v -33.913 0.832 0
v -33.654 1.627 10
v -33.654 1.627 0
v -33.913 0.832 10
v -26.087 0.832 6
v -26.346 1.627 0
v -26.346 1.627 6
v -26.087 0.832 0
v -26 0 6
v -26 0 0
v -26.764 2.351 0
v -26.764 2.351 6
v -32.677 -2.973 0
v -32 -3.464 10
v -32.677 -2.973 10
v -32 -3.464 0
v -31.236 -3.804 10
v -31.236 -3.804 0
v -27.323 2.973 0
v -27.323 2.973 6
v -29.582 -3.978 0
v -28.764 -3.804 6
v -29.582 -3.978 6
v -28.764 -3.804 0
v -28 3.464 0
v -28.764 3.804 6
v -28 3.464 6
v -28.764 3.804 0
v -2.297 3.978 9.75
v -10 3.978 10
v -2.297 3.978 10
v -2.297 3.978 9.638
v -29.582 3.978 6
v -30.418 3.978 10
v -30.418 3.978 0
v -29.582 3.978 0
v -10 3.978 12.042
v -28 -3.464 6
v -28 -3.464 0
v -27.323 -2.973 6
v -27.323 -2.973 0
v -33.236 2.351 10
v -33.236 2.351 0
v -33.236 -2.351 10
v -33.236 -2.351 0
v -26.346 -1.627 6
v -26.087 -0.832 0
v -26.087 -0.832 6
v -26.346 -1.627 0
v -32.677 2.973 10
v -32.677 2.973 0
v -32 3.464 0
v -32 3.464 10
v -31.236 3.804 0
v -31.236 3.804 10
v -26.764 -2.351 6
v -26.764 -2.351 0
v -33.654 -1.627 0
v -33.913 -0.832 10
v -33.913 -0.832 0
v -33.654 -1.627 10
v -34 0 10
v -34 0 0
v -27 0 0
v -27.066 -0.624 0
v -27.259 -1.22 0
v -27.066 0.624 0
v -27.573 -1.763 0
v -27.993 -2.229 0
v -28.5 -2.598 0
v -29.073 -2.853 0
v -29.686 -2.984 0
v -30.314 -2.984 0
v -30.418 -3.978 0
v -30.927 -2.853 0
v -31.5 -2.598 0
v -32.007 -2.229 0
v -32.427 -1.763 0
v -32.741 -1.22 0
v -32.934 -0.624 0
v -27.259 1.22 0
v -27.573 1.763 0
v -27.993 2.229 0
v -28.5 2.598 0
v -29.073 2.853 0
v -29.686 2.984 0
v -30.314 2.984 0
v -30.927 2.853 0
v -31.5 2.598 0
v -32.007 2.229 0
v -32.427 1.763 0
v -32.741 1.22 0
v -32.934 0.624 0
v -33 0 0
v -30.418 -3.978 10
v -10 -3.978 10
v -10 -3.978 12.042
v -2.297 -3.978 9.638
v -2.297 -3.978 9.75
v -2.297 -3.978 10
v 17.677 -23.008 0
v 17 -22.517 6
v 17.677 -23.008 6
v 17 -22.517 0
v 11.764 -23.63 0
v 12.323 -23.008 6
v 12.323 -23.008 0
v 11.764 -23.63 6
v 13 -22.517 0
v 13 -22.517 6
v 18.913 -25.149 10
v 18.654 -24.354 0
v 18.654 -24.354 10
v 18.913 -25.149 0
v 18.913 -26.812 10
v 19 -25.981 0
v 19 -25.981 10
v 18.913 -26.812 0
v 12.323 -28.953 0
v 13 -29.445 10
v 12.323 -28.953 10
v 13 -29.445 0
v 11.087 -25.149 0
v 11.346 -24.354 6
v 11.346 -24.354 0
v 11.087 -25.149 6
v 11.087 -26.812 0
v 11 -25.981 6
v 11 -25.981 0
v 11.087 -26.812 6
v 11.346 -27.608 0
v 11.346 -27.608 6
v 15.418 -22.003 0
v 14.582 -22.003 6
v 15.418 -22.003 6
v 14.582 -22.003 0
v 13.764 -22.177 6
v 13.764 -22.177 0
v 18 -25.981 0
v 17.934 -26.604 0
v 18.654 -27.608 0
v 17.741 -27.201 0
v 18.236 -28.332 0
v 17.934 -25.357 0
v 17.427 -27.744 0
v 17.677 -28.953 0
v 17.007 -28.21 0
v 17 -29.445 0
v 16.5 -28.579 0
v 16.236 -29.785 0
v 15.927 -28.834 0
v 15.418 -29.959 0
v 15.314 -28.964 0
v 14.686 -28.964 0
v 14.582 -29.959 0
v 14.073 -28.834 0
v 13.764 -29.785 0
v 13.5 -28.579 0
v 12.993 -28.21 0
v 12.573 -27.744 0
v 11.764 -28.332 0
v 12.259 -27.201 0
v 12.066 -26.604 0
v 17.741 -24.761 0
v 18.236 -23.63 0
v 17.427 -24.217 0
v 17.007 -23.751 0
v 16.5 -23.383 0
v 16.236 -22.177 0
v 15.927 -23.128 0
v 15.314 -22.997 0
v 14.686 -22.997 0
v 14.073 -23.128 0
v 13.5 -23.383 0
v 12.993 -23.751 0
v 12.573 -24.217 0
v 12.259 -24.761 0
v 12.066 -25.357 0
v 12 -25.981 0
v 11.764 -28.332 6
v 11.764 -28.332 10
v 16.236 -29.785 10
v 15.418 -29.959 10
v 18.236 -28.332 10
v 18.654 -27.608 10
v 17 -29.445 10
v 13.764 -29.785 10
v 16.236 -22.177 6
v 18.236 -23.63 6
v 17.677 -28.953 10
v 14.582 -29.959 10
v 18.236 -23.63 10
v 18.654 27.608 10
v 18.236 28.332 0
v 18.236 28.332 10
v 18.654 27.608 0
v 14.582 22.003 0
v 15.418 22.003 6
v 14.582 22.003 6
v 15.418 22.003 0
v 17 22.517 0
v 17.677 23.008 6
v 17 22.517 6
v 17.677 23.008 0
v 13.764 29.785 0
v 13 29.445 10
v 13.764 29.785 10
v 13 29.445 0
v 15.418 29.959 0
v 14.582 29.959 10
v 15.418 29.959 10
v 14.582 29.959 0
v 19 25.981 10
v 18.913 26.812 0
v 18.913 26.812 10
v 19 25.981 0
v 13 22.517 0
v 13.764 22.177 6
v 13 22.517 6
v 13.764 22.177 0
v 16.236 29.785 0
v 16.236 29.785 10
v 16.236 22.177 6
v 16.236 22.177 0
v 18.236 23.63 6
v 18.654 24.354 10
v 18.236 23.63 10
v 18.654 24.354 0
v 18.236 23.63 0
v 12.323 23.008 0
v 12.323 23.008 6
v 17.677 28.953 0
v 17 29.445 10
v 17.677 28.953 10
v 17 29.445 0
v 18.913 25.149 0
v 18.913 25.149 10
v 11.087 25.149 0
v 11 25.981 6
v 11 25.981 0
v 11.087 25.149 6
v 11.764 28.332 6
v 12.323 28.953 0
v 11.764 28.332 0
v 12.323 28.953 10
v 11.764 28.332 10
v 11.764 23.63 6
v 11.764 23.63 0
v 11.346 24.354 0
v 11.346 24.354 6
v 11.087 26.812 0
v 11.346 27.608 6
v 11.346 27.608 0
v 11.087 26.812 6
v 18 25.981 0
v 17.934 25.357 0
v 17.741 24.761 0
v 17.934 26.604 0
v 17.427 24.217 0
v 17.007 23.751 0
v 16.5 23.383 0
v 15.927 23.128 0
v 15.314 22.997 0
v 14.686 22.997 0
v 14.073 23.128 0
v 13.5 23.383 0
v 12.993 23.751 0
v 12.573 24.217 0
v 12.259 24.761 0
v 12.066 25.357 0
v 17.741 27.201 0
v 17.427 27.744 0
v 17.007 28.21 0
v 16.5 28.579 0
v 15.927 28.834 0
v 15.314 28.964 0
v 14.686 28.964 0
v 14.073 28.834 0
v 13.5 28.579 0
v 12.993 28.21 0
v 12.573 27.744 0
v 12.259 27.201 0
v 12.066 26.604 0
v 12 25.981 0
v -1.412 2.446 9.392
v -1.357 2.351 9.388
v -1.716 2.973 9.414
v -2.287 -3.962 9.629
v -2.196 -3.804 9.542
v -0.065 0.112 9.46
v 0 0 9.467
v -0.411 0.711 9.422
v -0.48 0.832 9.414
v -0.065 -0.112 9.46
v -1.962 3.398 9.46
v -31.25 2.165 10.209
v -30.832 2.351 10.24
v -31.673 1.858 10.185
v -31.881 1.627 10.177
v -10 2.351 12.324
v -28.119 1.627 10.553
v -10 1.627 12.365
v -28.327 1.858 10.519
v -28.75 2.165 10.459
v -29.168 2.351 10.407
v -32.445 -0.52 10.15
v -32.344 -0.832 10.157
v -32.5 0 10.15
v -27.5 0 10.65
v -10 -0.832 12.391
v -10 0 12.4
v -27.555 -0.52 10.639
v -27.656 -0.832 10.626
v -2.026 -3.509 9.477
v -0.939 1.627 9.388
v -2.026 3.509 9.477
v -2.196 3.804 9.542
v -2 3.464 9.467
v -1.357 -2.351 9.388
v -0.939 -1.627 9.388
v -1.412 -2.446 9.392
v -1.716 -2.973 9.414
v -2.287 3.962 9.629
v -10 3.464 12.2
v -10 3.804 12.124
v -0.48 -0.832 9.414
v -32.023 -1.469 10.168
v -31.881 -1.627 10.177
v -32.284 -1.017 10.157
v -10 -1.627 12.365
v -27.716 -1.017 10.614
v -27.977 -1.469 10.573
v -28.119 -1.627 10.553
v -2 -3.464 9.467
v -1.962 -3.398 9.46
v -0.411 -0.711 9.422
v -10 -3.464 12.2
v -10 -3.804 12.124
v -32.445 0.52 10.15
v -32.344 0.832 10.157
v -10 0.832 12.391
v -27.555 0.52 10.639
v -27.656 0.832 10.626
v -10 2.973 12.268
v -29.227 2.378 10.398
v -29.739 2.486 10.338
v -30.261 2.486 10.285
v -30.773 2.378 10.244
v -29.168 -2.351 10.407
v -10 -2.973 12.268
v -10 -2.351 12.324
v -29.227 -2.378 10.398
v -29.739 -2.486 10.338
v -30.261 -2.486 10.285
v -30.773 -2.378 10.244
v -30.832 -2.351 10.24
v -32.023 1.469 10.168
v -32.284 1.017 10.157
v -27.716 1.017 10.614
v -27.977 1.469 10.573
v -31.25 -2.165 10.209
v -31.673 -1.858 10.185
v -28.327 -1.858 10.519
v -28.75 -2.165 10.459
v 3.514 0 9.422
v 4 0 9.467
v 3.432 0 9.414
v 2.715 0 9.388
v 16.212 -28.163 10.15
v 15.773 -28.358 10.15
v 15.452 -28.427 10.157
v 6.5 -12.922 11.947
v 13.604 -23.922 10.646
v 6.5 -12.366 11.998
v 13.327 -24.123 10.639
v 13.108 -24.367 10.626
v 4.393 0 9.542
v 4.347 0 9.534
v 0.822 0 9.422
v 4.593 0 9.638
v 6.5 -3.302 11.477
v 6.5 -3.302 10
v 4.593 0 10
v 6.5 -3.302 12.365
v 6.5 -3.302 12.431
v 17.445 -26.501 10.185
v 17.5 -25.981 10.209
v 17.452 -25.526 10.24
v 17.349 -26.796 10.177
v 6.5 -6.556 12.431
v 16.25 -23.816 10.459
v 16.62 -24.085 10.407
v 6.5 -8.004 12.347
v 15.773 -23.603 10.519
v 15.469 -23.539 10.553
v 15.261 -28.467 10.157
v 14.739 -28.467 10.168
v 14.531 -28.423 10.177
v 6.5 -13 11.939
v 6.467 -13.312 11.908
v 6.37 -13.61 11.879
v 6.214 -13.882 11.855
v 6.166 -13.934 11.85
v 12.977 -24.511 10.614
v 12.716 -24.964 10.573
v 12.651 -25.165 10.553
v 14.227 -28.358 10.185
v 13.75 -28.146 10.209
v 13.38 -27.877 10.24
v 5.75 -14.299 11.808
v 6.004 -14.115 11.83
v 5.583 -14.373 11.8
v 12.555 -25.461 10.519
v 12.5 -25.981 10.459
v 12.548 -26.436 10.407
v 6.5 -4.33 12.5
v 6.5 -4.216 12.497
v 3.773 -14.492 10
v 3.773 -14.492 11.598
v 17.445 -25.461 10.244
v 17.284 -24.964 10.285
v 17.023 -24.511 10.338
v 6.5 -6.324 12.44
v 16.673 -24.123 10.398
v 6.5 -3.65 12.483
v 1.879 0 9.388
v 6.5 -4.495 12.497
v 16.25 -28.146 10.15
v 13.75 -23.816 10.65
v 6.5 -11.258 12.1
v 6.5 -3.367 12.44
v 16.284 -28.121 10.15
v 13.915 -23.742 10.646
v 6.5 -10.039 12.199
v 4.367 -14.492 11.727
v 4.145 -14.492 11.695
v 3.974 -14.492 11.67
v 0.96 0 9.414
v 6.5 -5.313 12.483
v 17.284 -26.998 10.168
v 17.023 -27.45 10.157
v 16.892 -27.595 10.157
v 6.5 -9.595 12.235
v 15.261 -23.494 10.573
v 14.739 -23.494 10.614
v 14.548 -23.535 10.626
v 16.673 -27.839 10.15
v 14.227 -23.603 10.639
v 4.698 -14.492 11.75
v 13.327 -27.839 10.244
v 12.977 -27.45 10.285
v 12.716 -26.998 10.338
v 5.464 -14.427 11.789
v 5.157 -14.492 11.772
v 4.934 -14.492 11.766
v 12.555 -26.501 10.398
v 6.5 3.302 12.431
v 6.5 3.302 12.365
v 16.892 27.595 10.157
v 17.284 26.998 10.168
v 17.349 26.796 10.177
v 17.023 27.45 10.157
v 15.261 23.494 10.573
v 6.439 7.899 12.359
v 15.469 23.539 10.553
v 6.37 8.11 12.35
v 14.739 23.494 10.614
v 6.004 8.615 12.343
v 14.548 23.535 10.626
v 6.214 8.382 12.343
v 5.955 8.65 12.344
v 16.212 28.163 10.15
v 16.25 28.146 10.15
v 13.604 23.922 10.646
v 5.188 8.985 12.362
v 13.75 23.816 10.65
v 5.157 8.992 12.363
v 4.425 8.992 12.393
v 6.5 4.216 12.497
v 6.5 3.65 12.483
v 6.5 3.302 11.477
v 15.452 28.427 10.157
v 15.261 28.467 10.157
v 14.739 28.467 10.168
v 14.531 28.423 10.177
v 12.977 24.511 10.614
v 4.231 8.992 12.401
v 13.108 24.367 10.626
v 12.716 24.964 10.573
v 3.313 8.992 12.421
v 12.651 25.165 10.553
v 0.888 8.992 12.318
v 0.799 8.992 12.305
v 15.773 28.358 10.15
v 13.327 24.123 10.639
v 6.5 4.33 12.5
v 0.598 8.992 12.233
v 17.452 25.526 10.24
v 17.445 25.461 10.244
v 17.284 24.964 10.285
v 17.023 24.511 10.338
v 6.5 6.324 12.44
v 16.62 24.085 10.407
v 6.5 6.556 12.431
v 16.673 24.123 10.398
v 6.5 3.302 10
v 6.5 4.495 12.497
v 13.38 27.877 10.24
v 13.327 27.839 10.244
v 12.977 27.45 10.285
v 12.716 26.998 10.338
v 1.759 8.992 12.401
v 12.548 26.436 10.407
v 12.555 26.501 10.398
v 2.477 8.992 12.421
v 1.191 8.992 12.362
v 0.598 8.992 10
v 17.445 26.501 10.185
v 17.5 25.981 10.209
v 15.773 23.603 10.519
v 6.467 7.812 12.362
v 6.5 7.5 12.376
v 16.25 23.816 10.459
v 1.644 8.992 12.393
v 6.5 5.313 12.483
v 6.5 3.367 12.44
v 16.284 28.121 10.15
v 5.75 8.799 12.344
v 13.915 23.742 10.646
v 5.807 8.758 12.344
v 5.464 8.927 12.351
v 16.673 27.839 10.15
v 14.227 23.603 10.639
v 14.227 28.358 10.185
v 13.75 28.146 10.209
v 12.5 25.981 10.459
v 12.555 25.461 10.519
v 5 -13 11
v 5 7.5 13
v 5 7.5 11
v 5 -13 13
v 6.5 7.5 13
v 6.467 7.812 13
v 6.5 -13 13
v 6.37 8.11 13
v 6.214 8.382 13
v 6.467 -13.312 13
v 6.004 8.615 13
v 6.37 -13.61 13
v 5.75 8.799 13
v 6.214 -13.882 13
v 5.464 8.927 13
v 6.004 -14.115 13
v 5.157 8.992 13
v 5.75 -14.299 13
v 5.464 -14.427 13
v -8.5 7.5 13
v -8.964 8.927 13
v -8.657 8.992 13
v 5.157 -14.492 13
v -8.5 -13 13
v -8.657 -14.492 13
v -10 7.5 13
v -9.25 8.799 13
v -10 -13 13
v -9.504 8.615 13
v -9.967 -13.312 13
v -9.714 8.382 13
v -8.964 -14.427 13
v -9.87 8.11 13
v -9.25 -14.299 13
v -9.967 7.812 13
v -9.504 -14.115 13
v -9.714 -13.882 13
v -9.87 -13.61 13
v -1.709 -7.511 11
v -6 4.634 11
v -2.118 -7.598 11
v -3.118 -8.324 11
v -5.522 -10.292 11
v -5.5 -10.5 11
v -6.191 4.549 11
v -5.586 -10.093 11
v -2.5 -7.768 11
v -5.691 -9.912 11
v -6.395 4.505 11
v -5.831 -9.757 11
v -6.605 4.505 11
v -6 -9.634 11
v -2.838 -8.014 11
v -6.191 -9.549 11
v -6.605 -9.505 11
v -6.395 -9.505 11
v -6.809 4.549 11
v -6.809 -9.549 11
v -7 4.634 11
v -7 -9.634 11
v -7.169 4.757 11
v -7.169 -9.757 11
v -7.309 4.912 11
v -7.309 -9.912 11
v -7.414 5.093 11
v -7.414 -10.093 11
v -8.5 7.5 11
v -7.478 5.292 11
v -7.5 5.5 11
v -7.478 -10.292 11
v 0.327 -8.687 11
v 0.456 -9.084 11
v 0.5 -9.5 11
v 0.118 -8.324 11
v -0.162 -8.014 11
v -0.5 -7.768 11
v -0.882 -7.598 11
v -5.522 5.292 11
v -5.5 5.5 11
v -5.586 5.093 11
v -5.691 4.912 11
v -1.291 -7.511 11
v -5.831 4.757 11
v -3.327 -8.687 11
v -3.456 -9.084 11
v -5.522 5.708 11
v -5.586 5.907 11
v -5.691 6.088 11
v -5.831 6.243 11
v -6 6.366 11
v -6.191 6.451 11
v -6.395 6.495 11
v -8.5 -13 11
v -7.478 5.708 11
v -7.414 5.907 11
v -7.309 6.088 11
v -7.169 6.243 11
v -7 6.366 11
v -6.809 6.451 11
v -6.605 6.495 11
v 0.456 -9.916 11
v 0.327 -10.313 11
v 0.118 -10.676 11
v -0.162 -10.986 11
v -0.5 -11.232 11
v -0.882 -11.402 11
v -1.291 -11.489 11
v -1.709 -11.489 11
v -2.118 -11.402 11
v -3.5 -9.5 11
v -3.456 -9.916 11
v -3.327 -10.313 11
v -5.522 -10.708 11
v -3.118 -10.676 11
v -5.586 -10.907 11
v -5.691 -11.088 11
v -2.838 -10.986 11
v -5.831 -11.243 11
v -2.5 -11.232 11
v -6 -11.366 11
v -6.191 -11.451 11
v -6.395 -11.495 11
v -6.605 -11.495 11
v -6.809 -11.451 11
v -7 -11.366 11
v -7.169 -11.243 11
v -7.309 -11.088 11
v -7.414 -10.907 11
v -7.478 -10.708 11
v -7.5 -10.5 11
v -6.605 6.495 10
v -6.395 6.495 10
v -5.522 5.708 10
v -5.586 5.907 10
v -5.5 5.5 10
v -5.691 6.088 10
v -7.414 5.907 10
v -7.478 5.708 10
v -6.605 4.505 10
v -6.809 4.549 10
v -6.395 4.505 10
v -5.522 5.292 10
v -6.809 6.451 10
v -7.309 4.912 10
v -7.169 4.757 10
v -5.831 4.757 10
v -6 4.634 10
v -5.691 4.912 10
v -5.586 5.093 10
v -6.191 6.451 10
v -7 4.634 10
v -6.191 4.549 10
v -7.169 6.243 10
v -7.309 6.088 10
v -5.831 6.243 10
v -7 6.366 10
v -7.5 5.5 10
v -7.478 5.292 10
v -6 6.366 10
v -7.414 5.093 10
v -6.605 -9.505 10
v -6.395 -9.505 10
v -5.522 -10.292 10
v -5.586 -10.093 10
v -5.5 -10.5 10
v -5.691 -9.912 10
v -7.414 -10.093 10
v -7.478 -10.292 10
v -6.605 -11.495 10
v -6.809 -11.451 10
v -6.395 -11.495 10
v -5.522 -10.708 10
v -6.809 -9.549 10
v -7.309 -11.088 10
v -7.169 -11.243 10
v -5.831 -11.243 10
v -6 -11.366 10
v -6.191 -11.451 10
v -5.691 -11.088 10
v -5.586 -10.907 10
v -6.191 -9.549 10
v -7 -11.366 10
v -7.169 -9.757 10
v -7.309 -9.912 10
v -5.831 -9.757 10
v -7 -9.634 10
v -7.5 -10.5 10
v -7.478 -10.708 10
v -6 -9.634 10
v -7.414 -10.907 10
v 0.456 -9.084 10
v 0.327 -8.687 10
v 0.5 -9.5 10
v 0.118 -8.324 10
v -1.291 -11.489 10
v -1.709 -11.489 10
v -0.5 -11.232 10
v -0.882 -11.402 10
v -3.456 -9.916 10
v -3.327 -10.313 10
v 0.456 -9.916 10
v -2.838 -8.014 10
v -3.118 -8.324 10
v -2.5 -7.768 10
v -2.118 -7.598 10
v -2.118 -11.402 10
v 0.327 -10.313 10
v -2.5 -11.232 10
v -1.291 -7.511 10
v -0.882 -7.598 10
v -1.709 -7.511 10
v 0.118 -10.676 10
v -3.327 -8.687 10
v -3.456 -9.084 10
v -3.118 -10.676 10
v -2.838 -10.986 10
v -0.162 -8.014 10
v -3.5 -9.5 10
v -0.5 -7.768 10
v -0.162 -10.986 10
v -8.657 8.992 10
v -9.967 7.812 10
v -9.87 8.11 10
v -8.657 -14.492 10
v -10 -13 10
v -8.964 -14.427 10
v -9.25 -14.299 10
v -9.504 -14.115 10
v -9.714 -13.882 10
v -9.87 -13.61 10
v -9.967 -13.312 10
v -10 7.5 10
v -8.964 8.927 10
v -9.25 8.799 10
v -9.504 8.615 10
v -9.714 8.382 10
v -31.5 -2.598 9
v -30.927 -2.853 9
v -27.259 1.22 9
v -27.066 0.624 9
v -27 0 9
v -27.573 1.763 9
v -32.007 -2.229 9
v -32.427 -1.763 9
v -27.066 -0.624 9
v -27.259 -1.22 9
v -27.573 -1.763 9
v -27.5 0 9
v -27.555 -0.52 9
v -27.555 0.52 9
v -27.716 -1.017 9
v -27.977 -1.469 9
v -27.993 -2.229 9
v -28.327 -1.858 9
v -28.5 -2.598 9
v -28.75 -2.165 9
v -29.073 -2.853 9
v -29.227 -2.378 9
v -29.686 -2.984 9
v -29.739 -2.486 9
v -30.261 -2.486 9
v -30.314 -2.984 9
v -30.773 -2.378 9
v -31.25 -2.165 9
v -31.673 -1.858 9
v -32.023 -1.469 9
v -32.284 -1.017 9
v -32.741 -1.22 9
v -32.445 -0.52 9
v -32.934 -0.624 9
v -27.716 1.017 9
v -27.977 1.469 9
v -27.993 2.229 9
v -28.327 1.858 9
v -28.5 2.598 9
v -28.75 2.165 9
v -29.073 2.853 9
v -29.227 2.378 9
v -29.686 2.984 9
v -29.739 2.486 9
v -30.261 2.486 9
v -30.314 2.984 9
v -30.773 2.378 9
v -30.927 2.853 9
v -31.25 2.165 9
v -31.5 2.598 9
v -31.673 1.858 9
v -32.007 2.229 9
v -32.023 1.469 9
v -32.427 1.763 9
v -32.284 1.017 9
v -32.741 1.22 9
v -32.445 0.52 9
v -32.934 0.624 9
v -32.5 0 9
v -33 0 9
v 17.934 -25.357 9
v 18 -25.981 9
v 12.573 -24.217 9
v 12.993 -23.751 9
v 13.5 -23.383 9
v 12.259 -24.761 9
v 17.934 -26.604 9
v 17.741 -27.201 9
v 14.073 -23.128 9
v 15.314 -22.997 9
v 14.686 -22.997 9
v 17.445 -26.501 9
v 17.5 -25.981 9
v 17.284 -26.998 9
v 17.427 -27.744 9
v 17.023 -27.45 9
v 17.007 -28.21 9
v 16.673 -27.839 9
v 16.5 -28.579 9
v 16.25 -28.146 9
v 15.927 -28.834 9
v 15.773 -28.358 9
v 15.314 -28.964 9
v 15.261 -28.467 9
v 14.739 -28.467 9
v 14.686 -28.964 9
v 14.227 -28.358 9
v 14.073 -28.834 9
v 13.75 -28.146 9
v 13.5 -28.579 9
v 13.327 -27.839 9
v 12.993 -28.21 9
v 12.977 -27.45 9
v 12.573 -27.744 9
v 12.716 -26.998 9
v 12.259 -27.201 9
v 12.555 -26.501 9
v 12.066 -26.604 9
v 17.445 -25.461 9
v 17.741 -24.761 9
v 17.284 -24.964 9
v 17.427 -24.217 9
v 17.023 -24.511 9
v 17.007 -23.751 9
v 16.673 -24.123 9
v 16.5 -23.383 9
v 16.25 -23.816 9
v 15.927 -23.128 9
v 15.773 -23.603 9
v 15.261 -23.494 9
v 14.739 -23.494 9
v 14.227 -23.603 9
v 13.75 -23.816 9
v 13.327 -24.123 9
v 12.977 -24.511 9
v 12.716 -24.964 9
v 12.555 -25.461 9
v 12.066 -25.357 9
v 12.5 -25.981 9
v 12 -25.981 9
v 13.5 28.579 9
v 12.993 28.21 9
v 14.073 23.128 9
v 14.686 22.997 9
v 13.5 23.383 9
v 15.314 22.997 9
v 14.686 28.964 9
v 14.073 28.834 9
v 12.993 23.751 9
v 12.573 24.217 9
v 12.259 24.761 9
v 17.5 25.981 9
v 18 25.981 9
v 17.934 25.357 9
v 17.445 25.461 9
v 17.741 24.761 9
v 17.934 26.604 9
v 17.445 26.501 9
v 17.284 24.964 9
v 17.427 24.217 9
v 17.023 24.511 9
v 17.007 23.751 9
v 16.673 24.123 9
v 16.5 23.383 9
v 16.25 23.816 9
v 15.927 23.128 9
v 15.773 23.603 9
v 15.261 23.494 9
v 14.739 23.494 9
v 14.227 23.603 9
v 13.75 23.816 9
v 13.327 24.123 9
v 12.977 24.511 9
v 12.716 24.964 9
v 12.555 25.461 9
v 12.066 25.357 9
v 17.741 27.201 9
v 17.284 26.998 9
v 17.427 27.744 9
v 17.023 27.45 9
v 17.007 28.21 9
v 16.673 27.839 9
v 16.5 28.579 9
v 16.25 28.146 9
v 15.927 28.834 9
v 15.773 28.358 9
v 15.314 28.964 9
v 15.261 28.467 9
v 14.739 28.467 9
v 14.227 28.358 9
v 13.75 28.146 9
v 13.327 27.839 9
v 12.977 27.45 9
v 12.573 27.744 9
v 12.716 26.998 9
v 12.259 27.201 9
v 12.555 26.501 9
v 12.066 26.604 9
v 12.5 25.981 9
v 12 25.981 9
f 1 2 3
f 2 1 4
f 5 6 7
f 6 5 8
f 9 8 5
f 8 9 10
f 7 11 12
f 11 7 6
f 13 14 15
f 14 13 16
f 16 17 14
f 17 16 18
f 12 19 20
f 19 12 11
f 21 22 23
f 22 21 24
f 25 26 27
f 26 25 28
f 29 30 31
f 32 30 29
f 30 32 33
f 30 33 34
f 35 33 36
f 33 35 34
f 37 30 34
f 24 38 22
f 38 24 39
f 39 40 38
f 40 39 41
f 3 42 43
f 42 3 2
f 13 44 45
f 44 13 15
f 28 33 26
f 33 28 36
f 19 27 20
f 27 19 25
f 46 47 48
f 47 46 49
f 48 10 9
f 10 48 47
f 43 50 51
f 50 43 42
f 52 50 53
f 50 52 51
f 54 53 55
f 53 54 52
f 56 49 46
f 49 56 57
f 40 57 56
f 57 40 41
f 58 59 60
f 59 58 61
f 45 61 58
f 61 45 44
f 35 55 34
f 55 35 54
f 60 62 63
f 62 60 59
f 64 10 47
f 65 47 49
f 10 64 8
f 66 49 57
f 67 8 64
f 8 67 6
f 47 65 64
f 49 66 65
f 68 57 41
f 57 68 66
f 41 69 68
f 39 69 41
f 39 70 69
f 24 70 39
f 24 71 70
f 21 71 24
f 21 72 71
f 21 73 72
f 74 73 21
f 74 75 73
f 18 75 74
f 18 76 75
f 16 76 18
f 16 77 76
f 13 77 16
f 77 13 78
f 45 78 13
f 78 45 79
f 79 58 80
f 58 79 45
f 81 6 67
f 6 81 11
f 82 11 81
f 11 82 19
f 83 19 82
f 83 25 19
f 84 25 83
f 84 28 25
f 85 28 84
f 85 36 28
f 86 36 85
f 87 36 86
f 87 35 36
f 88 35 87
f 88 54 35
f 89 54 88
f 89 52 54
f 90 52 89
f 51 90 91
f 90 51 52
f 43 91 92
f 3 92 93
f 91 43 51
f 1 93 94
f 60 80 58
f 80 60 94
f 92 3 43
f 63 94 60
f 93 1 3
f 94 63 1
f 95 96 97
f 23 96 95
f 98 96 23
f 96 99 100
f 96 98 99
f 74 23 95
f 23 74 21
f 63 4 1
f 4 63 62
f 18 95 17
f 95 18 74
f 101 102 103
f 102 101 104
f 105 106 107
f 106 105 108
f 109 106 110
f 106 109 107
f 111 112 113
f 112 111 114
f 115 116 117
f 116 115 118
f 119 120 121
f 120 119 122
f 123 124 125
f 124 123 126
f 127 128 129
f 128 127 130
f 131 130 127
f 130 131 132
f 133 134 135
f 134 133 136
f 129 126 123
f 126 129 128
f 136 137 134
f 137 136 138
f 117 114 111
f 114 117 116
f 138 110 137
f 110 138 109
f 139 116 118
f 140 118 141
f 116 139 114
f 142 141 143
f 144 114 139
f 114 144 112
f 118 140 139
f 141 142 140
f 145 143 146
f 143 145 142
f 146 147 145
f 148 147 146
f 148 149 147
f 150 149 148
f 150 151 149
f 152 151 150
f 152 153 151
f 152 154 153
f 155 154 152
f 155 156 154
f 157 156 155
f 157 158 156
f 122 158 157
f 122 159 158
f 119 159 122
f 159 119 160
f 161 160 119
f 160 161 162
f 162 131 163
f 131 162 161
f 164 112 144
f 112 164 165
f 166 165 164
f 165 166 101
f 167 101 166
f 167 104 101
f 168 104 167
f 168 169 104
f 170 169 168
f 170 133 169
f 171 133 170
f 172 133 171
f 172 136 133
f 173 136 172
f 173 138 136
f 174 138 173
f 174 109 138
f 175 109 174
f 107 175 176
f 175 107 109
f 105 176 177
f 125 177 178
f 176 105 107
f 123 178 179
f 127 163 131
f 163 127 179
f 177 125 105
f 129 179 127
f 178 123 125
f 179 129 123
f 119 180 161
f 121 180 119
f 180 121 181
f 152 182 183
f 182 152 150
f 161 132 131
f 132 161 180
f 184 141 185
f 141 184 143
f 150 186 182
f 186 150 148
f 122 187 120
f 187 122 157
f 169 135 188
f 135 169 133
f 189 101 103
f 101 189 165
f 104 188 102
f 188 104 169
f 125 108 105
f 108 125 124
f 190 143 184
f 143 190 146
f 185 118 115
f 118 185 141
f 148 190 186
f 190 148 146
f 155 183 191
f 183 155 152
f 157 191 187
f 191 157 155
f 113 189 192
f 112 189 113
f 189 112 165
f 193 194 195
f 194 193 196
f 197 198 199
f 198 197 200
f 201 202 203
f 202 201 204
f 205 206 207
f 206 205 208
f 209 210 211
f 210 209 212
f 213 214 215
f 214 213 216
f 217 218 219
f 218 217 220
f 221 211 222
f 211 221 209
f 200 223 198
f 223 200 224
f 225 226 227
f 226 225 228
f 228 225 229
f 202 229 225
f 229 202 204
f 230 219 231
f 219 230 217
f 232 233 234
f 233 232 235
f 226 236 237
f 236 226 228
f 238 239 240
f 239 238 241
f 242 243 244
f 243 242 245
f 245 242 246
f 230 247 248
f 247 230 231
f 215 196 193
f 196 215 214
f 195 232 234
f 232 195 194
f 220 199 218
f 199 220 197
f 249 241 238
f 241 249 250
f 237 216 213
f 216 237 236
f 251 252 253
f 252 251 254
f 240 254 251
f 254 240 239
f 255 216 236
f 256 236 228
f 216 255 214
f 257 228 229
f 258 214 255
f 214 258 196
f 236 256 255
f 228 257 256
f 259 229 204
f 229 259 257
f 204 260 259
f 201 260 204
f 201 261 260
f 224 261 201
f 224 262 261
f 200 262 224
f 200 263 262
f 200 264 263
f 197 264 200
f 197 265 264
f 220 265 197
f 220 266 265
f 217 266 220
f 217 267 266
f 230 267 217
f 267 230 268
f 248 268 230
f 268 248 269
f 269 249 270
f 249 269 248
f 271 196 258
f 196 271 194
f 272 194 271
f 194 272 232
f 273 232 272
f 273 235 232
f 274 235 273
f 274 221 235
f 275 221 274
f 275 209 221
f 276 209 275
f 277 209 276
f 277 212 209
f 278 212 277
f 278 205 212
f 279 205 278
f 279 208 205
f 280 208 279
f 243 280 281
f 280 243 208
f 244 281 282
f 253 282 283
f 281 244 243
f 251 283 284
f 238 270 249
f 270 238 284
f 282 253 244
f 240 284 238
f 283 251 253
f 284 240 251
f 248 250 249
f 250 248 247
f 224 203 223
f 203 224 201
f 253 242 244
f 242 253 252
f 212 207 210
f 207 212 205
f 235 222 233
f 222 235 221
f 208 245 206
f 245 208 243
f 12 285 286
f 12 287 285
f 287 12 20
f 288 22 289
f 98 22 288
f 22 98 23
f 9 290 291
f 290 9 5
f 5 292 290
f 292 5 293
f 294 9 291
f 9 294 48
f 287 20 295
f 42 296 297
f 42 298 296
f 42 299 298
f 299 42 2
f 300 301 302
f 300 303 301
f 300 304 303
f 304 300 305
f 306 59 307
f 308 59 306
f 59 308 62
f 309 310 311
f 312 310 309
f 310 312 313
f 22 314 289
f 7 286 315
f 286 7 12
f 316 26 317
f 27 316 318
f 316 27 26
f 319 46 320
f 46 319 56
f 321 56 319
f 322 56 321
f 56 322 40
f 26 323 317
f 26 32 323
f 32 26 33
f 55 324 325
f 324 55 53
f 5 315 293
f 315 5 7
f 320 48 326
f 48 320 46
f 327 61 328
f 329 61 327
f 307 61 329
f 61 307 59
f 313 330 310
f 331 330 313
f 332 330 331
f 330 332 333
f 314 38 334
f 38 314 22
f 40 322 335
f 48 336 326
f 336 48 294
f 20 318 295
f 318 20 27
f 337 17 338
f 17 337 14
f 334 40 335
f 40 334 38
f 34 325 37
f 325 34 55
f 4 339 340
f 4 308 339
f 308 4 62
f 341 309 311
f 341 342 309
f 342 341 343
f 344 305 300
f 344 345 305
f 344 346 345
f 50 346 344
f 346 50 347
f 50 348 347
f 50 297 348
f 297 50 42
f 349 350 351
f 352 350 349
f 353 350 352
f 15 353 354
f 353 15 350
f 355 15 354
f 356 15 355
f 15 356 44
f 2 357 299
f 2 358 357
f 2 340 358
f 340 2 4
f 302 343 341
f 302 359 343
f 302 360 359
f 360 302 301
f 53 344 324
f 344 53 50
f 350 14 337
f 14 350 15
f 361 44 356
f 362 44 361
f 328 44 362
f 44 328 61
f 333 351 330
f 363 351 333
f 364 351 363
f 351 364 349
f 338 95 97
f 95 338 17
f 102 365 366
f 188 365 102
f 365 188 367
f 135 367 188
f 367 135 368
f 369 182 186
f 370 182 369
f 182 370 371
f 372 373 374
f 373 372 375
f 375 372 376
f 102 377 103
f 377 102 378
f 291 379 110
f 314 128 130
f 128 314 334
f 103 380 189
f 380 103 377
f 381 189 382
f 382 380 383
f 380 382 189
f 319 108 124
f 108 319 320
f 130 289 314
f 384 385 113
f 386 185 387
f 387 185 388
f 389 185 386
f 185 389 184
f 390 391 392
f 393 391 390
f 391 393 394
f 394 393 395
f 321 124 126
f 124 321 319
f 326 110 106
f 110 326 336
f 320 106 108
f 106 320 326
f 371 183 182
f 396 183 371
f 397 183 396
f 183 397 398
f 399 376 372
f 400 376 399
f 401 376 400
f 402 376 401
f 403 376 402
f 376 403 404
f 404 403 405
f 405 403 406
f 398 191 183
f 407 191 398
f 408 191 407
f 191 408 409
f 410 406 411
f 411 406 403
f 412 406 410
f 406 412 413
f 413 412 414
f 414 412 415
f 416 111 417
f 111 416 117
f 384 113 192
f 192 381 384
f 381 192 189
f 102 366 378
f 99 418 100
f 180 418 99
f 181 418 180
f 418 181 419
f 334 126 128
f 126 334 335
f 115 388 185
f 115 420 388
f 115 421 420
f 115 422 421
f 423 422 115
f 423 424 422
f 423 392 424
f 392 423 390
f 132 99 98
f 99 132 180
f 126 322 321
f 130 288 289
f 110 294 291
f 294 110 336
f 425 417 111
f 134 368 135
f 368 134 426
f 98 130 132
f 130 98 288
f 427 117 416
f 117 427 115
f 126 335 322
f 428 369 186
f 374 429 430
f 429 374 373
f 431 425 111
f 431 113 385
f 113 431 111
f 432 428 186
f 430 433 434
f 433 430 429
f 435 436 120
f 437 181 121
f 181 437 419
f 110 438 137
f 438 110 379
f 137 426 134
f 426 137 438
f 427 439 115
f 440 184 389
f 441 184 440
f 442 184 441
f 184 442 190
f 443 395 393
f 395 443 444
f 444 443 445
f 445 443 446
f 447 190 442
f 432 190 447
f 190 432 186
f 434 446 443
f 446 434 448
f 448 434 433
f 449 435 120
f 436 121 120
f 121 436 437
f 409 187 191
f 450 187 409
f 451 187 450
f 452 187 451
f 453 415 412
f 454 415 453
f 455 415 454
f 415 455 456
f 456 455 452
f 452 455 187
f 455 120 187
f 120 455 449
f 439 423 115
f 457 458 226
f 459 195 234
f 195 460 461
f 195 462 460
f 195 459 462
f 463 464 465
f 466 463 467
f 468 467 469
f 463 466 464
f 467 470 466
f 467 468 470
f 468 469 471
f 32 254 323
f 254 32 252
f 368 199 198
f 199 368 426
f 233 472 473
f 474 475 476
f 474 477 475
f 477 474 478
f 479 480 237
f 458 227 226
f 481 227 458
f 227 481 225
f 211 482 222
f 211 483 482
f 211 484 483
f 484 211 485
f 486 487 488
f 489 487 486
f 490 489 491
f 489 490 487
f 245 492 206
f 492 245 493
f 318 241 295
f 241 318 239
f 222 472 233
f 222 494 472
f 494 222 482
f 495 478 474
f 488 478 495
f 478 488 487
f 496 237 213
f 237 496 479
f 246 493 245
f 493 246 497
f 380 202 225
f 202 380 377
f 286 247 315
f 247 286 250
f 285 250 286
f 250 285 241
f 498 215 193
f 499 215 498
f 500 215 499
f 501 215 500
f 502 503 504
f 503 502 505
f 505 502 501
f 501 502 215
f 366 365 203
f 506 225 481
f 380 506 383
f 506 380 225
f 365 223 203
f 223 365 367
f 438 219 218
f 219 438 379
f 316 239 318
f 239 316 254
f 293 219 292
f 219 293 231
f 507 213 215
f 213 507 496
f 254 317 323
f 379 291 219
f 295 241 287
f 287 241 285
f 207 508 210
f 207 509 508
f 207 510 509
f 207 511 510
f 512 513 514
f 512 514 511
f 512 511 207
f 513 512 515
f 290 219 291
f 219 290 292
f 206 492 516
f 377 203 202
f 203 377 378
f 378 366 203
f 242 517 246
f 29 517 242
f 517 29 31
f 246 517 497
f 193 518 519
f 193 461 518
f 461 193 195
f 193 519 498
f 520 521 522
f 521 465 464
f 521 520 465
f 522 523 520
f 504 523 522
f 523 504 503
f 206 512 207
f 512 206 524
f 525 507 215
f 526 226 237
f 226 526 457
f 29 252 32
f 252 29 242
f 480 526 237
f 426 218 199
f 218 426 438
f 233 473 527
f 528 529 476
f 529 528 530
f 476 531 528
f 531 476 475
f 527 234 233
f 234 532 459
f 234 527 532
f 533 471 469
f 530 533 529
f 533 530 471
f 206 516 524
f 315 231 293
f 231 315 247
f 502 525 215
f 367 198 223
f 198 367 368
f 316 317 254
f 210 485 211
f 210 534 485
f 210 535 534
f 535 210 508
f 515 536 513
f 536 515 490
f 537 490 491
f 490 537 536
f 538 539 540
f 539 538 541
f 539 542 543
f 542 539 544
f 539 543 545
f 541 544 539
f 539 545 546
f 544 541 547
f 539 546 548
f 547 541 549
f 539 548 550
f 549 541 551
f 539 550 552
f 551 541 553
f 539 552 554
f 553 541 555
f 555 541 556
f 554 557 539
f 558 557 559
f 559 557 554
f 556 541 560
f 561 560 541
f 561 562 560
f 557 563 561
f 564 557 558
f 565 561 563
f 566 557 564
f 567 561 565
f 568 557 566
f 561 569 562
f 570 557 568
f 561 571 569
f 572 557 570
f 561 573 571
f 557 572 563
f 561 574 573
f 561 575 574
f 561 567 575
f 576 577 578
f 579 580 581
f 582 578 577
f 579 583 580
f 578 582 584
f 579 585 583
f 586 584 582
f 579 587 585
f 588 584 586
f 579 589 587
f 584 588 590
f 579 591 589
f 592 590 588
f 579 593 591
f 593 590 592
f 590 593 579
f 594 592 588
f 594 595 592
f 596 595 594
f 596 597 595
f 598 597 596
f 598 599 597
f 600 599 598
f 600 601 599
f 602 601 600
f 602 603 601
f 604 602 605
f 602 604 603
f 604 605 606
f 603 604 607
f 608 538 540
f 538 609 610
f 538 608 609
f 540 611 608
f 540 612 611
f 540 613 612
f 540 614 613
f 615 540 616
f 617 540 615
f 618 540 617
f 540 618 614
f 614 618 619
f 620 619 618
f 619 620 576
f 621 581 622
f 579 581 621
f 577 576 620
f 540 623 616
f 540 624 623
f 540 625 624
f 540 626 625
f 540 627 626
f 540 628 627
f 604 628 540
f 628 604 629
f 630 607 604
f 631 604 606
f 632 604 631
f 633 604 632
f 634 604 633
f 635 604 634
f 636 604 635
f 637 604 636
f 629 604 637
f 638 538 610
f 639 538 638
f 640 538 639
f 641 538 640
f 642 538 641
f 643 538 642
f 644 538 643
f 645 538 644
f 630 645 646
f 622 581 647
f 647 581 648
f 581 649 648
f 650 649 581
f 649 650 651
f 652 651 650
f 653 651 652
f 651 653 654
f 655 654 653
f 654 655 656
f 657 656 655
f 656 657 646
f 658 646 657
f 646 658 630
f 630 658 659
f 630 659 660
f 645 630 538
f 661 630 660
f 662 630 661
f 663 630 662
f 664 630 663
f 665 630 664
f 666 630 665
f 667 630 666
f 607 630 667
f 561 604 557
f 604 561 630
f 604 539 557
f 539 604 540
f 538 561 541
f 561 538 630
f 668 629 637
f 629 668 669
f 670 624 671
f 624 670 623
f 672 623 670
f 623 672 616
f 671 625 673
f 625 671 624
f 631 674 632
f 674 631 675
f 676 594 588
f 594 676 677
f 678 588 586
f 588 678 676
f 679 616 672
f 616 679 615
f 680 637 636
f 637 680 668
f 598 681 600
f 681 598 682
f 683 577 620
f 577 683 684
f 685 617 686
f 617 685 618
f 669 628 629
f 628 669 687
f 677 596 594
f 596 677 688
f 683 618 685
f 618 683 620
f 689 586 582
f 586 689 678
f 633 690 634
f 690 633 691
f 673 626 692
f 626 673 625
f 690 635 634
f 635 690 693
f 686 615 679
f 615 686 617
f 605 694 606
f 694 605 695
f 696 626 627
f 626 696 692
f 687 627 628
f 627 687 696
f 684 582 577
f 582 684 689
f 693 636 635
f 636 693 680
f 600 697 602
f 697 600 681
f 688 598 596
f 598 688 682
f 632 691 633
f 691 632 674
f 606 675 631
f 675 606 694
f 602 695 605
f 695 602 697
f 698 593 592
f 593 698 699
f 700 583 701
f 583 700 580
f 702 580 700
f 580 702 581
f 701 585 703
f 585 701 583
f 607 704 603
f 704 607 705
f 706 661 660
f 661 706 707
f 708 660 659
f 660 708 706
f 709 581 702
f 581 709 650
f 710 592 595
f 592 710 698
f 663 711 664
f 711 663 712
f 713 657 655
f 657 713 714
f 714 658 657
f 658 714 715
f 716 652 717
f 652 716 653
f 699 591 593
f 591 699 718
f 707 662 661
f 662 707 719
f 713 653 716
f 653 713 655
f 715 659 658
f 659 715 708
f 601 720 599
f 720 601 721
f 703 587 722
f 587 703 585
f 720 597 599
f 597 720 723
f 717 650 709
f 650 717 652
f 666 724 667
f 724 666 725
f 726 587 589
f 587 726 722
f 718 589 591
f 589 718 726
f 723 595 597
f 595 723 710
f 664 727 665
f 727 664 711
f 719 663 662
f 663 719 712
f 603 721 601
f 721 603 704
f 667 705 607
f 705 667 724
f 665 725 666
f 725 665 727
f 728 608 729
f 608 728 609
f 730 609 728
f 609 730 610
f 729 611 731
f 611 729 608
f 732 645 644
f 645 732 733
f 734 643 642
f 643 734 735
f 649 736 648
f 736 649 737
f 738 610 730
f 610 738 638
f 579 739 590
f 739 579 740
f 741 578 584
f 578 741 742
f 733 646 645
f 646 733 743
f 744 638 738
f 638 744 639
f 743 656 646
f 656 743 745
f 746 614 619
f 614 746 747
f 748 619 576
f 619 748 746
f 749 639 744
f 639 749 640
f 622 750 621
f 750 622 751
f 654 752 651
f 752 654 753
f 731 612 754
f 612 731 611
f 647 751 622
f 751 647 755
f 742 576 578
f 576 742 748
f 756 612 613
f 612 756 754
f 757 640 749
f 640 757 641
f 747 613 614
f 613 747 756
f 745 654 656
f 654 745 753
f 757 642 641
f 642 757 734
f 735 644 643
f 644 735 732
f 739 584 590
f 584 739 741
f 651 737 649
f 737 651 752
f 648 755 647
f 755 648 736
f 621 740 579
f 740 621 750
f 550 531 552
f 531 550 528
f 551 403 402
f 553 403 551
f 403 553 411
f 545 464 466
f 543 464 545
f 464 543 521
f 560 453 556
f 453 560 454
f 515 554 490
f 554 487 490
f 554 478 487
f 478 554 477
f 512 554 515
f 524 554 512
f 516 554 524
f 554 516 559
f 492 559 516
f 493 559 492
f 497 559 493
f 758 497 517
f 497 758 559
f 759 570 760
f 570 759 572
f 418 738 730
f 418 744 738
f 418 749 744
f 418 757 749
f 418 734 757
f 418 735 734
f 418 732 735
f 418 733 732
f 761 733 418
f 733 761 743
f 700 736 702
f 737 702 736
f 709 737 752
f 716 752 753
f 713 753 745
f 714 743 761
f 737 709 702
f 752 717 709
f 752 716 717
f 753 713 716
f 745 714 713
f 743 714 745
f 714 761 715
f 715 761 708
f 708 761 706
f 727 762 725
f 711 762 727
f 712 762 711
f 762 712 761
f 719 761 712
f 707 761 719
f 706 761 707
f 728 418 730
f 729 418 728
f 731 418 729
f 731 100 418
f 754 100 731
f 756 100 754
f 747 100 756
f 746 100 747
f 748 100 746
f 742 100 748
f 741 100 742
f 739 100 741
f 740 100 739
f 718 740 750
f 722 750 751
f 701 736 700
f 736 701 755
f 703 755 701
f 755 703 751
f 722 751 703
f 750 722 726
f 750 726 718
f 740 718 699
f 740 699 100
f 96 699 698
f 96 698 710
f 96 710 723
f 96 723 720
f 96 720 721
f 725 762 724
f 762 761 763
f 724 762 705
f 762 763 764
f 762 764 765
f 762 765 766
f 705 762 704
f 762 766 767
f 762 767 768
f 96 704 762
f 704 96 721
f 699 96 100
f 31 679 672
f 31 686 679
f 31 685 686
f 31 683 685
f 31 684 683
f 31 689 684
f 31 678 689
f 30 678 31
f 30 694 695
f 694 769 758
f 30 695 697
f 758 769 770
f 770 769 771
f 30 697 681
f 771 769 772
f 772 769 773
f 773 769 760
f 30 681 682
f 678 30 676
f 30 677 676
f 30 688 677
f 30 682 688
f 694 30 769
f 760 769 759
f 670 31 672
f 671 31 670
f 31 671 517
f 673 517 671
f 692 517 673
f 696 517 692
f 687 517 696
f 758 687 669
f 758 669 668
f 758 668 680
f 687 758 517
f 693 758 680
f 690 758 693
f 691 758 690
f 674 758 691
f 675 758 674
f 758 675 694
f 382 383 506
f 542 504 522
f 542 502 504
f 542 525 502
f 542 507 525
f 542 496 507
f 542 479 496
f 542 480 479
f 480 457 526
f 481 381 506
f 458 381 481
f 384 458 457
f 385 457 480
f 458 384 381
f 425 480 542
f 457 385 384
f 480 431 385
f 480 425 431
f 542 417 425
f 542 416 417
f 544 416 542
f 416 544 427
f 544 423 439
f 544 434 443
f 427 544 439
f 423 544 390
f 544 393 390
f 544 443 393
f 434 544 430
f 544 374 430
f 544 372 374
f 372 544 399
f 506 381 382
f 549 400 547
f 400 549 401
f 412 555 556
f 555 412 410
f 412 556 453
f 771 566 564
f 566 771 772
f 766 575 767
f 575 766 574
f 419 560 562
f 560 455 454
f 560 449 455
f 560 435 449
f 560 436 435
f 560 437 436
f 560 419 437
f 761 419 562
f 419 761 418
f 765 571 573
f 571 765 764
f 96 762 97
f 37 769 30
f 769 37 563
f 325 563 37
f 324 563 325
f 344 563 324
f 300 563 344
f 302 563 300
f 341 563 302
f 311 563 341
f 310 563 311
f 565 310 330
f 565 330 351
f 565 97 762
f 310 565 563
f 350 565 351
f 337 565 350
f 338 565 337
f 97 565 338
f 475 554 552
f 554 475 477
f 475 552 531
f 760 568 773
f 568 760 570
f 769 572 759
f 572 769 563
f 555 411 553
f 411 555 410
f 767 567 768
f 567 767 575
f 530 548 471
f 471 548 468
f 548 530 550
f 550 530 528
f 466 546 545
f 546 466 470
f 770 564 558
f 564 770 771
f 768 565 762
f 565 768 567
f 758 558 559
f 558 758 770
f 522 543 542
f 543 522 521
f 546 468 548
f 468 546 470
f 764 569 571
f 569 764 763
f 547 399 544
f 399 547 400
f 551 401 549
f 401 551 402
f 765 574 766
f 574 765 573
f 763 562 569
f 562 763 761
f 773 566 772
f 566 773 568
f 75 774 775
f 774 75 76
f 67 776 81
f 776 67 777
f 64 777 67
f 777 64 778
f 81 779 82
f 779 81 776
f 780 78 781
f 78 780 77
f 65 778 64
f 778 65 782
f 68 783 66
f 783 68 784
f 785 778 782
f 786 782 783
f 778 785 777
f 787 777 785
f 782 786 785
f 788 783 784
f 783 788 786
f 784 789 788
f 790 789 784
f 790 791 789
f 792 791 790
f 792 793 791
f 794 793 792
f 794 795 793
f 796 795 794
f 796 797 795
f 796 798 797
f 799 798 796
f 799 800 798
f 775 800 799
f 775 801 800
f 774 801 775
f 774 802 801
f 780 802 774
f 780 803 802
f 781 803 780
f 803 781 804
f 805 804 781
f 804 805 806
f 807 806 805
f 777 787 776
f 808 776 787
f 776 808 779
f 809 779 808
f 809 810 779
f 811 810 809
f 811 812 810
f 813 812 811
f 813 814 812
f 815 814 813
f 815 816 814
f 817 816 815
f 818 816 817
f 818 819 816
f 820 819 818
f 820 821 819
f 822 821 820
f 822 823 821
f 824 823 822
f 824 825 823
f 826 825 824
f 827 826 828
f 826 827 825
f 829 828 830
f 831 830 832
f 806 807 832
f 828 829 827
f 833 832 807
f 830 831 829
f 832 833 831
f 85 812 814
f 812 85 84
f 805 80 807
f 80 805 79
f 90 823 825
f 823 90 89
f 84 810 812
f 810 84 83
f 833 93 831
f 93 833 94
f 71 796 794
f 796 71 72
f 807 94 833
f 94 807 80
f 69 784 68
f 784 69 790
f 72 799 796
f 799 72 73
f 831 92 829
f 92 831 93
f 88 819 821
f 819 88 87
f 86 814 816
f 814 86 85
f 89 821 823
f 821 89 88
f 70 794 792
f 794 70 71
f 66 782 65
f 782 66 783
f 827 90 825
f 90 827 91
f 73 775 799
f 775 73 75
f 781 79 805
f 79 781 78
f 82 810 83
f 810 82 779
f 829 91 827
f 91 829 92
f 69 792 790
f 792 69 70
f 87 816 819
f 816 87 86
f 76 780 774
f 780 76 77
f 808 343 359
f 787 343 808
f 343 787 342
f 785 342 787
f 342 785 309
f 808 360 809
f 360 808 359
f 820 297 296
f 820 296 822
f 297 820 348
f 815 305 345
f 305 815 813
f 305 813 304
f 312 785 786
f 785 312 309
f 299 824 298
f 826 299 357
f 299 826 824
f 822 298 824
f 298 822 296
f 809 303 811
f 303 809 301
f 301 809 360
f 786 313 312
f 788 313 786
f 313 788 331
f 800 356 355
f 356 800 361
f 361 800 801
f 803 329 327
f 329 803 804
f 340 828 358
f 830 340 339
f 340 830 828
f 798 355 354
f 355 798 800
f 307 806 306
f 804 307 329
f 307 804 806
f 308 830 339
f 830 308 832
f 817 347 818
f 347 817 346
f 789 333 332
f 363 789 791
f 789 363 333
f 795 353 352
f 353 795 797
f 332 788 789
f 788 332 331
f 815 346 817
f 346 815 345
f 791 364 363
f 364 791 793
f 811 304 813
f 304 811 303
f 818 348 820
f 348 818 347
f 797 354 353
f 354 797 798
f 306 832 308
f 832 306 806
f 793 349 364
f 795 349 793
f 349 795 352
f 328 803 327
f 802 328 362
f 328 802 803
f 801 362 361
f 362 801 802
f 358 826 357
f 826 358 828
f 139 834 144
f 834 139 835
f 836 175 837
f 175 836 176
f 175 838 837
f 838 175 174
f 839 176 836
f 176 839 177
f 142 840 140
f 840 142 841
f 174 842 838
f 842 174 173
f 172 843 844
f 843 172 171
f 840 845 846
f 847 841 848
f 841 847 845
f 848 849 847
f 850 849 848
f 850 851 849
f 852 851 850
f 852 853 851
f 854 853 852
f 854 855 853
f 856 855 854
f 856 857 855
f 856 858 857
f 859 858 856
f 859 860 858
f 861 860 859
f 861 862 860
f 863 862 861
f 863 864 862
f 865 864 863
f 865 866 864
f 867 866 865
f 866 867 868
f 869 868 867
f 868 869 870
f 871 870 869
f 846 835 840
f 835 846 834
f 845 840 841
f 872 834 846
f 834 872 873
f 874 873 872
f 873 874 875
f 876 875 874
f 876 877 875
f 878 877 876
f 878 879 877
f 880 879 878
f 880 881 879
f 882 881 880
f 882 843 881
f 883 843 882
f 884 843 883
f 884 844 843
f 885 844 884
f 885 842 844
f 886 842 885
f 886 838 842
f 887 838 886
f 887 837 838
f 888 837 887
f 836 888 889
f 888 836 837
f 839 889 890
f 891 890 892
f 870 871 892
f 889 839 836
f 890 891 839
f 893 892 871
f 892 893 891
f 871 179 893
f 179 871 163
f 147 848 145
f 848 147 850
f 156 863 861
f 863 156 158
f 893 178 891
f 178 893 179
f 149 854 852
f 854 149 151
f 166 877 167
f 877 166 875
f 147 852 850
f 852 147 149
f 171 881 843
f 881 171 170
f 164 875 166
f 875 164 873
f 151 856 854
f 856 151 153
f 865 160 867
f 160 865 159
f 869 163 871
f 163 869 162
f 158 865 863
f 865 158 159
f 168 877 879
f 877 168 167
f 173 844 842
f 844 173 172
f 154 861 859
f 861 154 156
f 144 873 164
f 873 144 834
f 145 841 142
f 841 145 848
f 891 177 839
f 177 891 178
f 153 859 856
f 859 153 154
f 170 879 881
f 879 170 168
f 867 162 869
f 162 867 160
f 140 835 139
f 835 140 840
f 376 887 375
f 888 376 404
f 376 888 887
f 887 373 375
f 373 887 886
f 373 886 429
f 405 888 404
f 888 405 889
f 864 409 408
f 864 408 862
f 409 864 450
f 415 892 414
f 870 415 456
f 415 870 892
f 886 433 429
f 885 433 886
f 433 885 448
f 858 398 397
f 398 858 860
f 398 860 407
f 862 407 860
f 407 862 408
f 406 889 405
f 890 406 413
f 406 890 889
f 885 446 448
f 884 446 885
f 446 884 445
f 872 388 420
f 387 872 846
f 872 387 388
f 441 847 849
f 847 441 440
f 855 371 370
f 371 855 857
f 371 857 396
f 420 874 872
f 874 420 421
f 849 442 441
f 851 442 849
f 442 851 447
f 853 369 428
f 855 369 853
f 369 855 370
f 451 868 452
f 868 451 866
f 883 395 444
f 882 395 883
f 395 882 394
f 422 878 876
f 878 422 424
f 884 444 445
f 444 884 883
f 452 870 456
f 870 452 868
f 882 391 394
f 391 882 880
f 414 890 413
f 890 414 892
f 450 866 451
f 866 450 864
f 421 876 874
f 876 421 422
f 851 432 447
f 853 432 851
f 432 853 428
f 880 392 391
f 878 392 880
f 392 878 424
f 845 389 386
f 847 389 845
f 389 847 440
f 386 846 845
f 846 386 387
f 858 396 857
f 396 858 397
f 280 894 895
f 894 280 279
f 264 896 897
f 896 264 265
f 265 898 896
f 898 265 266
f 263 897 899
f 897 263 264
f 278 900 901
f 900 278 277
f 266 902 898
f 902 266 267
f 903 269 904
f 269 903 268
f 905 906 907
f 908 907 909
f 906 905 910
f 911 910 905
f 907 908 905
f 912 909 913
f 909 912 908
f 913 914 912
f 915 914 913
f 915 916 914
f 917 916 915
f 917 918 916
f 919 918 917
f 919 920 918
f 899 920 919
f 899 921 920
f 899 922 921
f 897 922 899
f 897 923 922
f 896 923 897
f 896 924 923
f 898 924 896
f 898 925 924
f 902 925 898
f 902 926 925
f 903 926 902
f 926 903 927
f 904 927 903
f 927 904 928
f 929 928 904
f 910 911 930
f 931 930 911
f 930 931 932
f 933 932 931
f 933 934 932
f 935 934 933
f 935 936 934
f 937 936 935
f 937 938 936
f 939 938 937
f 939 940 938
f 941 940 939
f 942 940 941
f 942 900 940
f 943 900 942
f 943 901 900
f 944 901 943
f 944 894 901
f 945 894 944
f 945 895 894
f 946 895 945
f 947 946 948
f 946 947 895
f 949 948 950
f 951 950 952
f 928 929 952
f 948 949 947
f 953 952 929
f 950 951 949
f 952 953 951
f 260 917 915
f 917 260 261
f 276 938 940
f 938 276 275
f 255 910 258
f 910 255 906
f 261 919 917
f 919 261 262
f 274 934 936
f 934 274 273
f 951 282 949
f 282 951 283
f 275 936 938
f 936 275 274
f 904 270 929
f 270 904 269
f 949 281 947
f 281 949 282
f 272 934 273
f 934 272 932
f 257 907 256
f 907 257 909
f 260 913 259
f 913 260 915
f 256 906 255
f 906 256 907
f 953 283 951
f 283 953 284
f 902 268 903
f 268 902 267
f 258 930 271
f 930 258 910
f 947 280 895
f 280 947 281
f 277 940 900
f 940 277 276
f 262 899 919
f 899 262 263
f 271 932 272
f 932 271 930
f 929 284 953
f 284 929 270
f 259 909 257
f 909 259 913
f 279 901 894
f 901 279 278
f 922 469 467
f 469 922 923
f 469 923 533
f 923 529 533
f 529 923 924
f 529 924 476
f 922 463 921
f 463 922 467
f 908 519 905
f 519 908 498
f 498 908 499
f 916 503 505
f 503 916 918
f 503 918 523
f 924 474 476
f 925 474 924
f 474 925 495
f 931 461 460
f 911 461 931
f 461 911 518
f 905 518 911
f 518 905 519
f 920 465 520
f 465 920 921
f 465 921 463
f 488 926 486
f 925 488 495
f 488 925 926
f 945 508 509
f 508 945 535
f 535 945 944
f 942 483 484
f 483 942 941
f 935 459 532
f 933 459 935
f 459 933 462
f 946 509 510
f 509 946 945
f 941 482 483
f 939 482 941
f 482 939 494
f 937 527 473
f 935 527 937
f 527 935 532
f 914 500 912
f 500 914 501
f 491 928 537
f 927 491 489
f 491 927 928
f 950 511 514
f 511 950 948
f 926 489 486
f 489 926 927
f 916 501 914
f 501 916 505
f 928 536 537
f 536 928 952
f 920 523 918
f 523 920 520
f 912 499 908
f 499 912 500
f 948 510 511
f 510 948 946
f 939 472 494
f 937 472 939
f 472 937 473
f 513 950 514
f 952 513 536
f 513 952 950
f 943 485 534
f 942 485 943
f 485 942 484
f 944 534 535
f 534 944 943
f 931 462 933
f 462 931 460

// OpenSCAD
COOLER_DIA = 60;
COOLER_HEAD_DIA = 6;

PROBE_WIDTH = 13.5;
PROBE_LENGTH = 20.5;
PROBE_THICKNESS = 2;
PROBE_POINT_HEIGHT = 13;
PROBE_POINT_OFFSET_X = 8.5;
PROBE_POINT_OFFSET_Y = 7.5;
PROBE_MOUNT_HOLE_DIA = 2;
PROBE_MOUNT_HOLE_OFFSET_X = 2;
PROBE_MOUNT_HOLE_OFFSET_Y = 2;
PROBE_MOUNT_HOLE_SPACING = 16;
PROBE_CABLE_HOLE_DIA = 4;
PROBE_CABLE_HOLE_OFFSET_X = 7;
PROBE_CABLE_HOLE_OFFSET_Y = 17;

MOUNT_CORNER_DIA = 3;
MOUNT_THICKNESS = 3;
MOUNT_OFFSET_Z = 10;

MOUNT_MAGNET_LIP = 1;
MOUNT_MAGNET_DIA = 6;
MOUNT_MAGNET_HEIGHT = 8;
MOUNT_MAGNET_HOLDER_DIA = 8;

$fn = 30;

module probe() {
  translate([-PROBE_POINT_OFFSET_X, PROBE_POINT_OFFSET_Y, 0]) {
    translate([0, -PROBE_LENGTH, 0])
    cube([PROBE_WIDTH, PROBE_LENGTH, PROBE_THICKNESS]);

    translate([PROBE_POINT_OFFSET_X, -PROBE_POINT_OFFSET_Y, 0])
    cylinder(d = 2, h = PROBE_POINT_HEIGHT);

    #translate([PROBE_MOUNT_HOLE_OFFSET_X, -PROBE_MOUNT_HOLE_OFFSET_Y, 0])
    cylinder(d = PROBE_MOUNT_HOLE_DIA, h = PROBE_POINT_HEIGHT, center = true);

    #translate([PROBE_MOUNT_HOLE_OFFSET_X, -PROBE_MOUNT_HOLE_OFFSET_Y - PROBE_MOUNT_HOLE_SPACING, 0])
    cylinder(d = PROBE_MOUNT_HOLE_DIA, h = PROBE_POINT_HEIGHT, center = true);

    #translate([PROBE_CABLE_HOLE_OFFSET_X, -PROBE_CABLE_HOLE_OFFSET_Y, 0])
    cylinder(d = PROBE_CABLE_HOLE_DIA, h = PROBE_POINT_HEIGHT, center = true);
  }
}

module probe_mount() {
  difference() {
    translate([-PROBE_POINT_OFFSET_X, PROBE_POINT_OFFSET_Y - PROBE_LENGTH, 0])
    hull() {
      for(i = [0, 1]) {
        for(j = [0, 1]) {
          translate([i * PROBE_WIDTH, j * PROBE_LENGTH, 0])
          cylinder(d = MOUNT_CORNER_DIA, h = MOUNT_THICKNESS);
        }
      }
    }

    translate([0, 0, MOUNT_THICKNESS-PROBE_THICKNESS])
    probe();
  }
}

module mount() {
  difference() {
    union() {
      for(i = [0:2]) {
          rotate([0, 0, i * 120])
          translate([-COOLER_DIA/2, 0, 0])
          cylinder(d = MOUNT_MAGNET_HOLDER_DIA, h = 2 * MOUNT_MAGNET_LIP + MOUNT_MAGNET_HEIGHT);
      }


    for(i = [0:2]) {
        hull() {
          rotate([0, 0, i * 120])
          translate([-COOLER_DIA/2, 0, MOUNT_MAGNET_HEIGHT/2 + 2 * MOUNT_MAGNET_LIP])
          cylinder(d = MOUNT_MAGNET_HOLDER_DIA, h = MOUNT_MAGNET_HEIGHT/2);

          translate([0, 0, MOUNT_OFFSET_Z])
          cylinder(d = MOUNT_MAGNET_HOLDER_DIA, h = MOUNT_THICKNESS);
        }
      }

      translate([0, 0, MOUNT_OFFSET_Z])
      probe_mount();
    }

    translate([0, 0, MOUNT_OFFSET_Z+MOUNT_THICKNESS-PROBE_THICKNESS])
    probe();

    for(i = [0:2]) {
        rotate([0, 0, i * 120])
        translate([-COOLER_DIA/2, 0, 0]) {
          cylinder(d = MOUNT_MAGNET_DIA, h = MOUNT_MAGNET_LIP + MOUNT_MAGNET_HEIGHT);
          cylinder(d = MOUNT_MAGNET_DIA - MOUNT_MAGNET_LIP, h = MOUNT_MAGNET_LIP + MOUNT_MAGNET_HEIGHT * 2);
        }
    }
  }
}

mount();
